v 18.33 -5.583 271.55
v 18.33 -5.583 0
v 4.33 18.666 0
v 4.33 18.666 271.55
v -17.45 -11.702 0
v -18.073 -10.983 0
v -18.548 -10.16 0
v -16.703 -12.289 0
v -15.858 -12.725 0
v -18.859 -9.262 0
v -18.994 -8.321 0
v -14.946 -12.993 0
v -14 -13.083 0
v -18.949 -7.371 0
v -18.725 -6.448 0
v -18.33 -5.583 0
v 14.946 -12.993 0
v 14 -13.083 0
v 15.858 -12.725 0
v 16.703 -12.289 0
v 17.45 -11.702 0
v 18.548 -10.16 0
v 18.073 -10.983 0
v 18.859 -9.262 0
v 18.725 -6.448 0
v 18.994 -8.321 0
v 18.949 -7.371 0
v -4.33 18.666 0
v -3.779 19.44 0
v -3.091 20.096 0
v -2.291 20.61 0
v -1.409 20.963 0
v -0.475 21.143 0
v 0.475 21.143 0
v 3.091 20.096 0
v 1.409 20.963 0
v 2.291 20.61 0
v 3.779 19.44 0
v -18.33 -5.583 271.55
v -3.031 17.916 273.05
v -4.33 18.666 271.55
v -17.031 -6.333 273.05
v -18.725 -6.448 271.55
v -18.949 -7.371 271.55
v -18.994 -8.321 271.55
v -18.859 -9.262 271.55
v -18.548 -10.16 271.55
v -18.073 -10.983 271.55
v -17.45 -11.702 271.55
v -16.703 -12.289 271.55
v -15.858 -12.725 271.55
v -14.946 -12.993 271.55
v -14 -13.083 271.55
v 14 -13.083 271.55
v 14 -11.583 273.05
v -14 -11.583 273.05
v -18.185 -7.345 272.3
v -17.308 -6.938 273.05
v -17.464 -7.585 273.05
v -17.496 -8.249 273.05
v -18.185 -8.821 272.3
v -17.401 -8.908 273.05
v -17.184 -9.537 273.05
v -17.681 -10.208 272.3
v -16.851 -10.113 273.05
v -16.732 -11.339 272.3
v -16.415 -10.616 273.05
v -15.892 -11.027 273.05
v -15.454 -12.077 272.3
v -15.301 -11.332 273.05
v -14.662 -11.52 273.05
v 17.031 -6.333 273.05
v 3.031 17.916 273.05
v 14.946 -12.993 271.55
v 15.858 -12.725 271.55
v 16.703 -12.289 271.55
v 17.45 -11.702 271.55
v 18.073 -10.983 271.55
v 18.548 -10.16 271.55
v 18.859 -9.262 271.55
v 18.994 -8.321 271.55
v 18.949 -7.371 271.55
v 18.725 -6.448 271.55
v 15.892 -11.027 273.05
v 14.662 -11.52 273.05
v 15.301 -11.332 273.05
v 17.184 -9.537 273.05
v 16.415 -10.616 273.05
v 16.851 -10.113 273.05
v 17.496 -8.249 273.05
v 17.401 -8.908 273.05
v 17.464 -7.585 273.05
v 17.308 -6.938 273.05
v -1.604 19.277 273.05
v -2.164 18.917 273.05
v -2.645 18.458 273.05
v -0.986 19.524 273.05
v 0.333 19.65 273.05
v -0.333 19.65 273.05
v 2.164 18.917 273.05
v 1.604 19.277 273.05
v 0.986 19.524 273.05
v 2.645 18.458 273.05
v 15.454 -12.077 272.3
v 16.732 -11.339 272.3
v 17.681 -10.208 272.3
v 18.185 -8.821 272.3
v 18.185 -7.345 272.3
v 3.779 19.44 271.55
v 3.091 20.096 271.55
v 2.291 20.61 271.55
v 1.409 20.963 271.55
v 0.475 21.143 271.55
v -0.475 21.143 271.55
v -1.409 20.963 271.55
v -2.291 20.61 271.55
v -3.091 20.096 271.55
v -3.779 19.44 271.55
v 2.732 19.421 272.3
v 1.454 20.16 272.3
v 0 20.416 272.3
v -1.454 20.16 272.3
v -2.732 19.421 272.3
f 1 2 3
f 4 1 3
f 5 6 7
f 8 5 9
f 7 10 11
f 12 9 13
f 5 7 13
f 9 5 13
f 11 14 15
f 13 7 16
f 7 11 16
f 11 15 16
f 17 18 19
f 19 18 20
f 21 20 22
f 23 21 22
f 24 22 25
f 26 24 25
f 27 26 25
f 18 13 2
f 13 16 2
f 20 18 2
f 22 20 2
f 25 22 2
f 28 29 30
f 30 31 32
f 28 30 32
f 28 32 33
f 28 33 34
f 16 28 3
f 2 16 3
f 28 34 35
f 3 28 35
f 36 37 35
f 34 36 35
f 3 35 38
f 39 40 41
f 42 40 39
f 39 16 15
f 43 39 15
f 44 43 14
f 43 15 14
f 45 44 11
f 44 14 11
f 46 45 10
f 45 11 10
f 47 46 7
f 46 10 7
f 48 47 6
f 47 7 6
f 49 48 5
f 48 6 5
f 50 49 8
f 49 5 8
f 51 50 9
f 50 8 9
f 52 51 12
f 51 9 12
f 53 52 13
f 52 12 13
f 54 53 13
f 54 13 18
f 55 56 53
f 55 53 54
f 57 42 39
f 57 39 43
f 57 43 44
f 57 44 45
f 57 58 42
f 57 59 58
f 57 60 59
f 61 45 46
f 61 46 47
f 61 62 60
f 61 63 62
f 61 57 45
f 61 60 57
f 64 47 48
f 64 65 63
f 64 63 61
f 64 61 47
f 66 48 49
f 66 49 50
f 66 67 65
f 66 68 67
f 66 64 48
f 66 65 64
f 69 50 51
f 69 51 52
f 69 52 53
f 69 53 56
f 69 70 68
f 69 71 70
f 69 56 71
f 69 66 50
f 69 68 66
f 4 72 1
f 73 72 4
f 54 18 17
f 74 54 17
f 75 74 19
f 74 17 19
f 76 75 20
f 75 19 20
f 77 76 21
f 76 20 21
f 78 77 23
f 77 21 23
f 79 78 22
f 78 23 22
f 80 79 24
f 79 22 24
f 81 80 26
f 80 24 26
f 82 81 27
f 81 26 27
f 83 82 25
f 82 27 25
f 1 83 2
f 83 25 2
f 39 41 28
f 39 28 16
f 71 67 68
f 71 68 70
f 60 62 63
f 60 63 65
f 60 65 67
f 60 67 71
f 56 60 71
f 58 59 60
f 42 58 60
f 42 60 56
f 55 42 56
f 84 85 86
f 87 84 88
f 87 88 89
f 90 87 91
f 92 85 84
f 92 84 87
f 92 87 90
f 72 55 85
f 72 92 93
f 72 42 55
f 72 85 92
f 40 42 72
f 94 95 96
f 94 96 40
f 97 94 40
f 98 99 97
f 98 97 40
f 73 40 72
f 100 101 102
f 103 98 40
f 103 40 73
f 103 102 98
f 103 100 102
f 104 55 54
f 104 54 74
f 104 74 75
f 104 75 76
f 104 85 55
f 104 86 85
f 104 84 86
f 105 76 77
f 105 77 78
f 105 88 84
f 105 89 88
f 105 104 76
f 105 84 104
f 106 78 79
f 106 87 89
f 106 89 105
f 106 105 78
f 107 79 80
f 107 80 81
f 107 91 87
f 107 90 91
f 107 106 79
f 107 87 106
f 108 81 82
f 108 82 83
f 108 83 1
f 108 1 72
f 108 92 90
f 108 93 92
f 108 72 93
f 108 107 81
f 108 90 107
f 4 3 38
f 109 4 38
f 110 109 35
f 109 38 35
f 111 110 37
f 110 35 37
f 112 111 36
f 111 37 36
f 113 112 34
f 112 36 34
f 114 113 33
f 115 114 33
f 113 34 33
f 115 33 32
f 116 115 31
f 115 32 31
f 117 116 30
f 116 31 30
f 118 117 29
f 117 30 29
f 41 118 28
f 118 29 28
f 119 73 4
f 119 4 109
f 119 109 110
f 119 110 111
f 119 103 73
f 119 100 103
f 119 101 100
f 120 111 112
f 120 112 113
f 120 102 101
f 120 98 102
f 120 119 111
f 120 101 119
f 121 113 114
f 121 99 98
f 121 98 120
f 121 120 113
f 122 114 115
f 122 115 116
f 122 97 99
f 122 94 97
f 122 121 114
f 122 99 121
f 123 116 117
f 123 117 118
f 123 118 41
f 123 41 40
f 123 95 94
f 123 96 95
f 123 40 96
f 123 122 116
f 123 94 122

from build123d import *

# Parameters (mm, degrees)
F2_DEPTH = 273.05
F3_SIZE  = 1.5


with BuildPart() as f2:
    # F1 (on Top) → F2 (new body)
    with BuildSketch(Plane.XY):
        with BuildLine():
            Line((18.3301270189, -5.5829037687), (4.3301270189, 18.6658075373))
            ThreePointArc((4.3301270189, 18.6658075373), (0, 21.1658075373), (-4.3301270189, 18.6658075373))
            Line((-4.3301270189, 18.6658075373), (-18.3301270189, -5.5829037687))
            ThreePointArc((-18.3301270189, -5.5829037687), (-18.3301270189, -10.5829037687), (-14, -13.0829037687))
            Line((-14, -13.0829037687), (14, -13.0829037687))
            ThreePointArc((14, -13.0829037687), (18.3301270189, -10.5829037687), (18.3301270189, -5.5829037687))
        make_face()
    extrude(amount=F2_DEPTH)

    # F3
    f3_edges = [f2.edges().sort_by_distance(p)[0] for p in [
        (11.330127, 6.541452, 273.05),
        (0, 21.165808, 273.05),
        (-11.330127, 6.541452, 273.05),
        (-18.330127, -10.582904, 273.05),
        (0, -13.082904, 273.05),
        (18.330127, -10.582904, 273.05),
    ]]
    chamfer(f3_edges, length=F3_SIZE)


solid = f2.part
